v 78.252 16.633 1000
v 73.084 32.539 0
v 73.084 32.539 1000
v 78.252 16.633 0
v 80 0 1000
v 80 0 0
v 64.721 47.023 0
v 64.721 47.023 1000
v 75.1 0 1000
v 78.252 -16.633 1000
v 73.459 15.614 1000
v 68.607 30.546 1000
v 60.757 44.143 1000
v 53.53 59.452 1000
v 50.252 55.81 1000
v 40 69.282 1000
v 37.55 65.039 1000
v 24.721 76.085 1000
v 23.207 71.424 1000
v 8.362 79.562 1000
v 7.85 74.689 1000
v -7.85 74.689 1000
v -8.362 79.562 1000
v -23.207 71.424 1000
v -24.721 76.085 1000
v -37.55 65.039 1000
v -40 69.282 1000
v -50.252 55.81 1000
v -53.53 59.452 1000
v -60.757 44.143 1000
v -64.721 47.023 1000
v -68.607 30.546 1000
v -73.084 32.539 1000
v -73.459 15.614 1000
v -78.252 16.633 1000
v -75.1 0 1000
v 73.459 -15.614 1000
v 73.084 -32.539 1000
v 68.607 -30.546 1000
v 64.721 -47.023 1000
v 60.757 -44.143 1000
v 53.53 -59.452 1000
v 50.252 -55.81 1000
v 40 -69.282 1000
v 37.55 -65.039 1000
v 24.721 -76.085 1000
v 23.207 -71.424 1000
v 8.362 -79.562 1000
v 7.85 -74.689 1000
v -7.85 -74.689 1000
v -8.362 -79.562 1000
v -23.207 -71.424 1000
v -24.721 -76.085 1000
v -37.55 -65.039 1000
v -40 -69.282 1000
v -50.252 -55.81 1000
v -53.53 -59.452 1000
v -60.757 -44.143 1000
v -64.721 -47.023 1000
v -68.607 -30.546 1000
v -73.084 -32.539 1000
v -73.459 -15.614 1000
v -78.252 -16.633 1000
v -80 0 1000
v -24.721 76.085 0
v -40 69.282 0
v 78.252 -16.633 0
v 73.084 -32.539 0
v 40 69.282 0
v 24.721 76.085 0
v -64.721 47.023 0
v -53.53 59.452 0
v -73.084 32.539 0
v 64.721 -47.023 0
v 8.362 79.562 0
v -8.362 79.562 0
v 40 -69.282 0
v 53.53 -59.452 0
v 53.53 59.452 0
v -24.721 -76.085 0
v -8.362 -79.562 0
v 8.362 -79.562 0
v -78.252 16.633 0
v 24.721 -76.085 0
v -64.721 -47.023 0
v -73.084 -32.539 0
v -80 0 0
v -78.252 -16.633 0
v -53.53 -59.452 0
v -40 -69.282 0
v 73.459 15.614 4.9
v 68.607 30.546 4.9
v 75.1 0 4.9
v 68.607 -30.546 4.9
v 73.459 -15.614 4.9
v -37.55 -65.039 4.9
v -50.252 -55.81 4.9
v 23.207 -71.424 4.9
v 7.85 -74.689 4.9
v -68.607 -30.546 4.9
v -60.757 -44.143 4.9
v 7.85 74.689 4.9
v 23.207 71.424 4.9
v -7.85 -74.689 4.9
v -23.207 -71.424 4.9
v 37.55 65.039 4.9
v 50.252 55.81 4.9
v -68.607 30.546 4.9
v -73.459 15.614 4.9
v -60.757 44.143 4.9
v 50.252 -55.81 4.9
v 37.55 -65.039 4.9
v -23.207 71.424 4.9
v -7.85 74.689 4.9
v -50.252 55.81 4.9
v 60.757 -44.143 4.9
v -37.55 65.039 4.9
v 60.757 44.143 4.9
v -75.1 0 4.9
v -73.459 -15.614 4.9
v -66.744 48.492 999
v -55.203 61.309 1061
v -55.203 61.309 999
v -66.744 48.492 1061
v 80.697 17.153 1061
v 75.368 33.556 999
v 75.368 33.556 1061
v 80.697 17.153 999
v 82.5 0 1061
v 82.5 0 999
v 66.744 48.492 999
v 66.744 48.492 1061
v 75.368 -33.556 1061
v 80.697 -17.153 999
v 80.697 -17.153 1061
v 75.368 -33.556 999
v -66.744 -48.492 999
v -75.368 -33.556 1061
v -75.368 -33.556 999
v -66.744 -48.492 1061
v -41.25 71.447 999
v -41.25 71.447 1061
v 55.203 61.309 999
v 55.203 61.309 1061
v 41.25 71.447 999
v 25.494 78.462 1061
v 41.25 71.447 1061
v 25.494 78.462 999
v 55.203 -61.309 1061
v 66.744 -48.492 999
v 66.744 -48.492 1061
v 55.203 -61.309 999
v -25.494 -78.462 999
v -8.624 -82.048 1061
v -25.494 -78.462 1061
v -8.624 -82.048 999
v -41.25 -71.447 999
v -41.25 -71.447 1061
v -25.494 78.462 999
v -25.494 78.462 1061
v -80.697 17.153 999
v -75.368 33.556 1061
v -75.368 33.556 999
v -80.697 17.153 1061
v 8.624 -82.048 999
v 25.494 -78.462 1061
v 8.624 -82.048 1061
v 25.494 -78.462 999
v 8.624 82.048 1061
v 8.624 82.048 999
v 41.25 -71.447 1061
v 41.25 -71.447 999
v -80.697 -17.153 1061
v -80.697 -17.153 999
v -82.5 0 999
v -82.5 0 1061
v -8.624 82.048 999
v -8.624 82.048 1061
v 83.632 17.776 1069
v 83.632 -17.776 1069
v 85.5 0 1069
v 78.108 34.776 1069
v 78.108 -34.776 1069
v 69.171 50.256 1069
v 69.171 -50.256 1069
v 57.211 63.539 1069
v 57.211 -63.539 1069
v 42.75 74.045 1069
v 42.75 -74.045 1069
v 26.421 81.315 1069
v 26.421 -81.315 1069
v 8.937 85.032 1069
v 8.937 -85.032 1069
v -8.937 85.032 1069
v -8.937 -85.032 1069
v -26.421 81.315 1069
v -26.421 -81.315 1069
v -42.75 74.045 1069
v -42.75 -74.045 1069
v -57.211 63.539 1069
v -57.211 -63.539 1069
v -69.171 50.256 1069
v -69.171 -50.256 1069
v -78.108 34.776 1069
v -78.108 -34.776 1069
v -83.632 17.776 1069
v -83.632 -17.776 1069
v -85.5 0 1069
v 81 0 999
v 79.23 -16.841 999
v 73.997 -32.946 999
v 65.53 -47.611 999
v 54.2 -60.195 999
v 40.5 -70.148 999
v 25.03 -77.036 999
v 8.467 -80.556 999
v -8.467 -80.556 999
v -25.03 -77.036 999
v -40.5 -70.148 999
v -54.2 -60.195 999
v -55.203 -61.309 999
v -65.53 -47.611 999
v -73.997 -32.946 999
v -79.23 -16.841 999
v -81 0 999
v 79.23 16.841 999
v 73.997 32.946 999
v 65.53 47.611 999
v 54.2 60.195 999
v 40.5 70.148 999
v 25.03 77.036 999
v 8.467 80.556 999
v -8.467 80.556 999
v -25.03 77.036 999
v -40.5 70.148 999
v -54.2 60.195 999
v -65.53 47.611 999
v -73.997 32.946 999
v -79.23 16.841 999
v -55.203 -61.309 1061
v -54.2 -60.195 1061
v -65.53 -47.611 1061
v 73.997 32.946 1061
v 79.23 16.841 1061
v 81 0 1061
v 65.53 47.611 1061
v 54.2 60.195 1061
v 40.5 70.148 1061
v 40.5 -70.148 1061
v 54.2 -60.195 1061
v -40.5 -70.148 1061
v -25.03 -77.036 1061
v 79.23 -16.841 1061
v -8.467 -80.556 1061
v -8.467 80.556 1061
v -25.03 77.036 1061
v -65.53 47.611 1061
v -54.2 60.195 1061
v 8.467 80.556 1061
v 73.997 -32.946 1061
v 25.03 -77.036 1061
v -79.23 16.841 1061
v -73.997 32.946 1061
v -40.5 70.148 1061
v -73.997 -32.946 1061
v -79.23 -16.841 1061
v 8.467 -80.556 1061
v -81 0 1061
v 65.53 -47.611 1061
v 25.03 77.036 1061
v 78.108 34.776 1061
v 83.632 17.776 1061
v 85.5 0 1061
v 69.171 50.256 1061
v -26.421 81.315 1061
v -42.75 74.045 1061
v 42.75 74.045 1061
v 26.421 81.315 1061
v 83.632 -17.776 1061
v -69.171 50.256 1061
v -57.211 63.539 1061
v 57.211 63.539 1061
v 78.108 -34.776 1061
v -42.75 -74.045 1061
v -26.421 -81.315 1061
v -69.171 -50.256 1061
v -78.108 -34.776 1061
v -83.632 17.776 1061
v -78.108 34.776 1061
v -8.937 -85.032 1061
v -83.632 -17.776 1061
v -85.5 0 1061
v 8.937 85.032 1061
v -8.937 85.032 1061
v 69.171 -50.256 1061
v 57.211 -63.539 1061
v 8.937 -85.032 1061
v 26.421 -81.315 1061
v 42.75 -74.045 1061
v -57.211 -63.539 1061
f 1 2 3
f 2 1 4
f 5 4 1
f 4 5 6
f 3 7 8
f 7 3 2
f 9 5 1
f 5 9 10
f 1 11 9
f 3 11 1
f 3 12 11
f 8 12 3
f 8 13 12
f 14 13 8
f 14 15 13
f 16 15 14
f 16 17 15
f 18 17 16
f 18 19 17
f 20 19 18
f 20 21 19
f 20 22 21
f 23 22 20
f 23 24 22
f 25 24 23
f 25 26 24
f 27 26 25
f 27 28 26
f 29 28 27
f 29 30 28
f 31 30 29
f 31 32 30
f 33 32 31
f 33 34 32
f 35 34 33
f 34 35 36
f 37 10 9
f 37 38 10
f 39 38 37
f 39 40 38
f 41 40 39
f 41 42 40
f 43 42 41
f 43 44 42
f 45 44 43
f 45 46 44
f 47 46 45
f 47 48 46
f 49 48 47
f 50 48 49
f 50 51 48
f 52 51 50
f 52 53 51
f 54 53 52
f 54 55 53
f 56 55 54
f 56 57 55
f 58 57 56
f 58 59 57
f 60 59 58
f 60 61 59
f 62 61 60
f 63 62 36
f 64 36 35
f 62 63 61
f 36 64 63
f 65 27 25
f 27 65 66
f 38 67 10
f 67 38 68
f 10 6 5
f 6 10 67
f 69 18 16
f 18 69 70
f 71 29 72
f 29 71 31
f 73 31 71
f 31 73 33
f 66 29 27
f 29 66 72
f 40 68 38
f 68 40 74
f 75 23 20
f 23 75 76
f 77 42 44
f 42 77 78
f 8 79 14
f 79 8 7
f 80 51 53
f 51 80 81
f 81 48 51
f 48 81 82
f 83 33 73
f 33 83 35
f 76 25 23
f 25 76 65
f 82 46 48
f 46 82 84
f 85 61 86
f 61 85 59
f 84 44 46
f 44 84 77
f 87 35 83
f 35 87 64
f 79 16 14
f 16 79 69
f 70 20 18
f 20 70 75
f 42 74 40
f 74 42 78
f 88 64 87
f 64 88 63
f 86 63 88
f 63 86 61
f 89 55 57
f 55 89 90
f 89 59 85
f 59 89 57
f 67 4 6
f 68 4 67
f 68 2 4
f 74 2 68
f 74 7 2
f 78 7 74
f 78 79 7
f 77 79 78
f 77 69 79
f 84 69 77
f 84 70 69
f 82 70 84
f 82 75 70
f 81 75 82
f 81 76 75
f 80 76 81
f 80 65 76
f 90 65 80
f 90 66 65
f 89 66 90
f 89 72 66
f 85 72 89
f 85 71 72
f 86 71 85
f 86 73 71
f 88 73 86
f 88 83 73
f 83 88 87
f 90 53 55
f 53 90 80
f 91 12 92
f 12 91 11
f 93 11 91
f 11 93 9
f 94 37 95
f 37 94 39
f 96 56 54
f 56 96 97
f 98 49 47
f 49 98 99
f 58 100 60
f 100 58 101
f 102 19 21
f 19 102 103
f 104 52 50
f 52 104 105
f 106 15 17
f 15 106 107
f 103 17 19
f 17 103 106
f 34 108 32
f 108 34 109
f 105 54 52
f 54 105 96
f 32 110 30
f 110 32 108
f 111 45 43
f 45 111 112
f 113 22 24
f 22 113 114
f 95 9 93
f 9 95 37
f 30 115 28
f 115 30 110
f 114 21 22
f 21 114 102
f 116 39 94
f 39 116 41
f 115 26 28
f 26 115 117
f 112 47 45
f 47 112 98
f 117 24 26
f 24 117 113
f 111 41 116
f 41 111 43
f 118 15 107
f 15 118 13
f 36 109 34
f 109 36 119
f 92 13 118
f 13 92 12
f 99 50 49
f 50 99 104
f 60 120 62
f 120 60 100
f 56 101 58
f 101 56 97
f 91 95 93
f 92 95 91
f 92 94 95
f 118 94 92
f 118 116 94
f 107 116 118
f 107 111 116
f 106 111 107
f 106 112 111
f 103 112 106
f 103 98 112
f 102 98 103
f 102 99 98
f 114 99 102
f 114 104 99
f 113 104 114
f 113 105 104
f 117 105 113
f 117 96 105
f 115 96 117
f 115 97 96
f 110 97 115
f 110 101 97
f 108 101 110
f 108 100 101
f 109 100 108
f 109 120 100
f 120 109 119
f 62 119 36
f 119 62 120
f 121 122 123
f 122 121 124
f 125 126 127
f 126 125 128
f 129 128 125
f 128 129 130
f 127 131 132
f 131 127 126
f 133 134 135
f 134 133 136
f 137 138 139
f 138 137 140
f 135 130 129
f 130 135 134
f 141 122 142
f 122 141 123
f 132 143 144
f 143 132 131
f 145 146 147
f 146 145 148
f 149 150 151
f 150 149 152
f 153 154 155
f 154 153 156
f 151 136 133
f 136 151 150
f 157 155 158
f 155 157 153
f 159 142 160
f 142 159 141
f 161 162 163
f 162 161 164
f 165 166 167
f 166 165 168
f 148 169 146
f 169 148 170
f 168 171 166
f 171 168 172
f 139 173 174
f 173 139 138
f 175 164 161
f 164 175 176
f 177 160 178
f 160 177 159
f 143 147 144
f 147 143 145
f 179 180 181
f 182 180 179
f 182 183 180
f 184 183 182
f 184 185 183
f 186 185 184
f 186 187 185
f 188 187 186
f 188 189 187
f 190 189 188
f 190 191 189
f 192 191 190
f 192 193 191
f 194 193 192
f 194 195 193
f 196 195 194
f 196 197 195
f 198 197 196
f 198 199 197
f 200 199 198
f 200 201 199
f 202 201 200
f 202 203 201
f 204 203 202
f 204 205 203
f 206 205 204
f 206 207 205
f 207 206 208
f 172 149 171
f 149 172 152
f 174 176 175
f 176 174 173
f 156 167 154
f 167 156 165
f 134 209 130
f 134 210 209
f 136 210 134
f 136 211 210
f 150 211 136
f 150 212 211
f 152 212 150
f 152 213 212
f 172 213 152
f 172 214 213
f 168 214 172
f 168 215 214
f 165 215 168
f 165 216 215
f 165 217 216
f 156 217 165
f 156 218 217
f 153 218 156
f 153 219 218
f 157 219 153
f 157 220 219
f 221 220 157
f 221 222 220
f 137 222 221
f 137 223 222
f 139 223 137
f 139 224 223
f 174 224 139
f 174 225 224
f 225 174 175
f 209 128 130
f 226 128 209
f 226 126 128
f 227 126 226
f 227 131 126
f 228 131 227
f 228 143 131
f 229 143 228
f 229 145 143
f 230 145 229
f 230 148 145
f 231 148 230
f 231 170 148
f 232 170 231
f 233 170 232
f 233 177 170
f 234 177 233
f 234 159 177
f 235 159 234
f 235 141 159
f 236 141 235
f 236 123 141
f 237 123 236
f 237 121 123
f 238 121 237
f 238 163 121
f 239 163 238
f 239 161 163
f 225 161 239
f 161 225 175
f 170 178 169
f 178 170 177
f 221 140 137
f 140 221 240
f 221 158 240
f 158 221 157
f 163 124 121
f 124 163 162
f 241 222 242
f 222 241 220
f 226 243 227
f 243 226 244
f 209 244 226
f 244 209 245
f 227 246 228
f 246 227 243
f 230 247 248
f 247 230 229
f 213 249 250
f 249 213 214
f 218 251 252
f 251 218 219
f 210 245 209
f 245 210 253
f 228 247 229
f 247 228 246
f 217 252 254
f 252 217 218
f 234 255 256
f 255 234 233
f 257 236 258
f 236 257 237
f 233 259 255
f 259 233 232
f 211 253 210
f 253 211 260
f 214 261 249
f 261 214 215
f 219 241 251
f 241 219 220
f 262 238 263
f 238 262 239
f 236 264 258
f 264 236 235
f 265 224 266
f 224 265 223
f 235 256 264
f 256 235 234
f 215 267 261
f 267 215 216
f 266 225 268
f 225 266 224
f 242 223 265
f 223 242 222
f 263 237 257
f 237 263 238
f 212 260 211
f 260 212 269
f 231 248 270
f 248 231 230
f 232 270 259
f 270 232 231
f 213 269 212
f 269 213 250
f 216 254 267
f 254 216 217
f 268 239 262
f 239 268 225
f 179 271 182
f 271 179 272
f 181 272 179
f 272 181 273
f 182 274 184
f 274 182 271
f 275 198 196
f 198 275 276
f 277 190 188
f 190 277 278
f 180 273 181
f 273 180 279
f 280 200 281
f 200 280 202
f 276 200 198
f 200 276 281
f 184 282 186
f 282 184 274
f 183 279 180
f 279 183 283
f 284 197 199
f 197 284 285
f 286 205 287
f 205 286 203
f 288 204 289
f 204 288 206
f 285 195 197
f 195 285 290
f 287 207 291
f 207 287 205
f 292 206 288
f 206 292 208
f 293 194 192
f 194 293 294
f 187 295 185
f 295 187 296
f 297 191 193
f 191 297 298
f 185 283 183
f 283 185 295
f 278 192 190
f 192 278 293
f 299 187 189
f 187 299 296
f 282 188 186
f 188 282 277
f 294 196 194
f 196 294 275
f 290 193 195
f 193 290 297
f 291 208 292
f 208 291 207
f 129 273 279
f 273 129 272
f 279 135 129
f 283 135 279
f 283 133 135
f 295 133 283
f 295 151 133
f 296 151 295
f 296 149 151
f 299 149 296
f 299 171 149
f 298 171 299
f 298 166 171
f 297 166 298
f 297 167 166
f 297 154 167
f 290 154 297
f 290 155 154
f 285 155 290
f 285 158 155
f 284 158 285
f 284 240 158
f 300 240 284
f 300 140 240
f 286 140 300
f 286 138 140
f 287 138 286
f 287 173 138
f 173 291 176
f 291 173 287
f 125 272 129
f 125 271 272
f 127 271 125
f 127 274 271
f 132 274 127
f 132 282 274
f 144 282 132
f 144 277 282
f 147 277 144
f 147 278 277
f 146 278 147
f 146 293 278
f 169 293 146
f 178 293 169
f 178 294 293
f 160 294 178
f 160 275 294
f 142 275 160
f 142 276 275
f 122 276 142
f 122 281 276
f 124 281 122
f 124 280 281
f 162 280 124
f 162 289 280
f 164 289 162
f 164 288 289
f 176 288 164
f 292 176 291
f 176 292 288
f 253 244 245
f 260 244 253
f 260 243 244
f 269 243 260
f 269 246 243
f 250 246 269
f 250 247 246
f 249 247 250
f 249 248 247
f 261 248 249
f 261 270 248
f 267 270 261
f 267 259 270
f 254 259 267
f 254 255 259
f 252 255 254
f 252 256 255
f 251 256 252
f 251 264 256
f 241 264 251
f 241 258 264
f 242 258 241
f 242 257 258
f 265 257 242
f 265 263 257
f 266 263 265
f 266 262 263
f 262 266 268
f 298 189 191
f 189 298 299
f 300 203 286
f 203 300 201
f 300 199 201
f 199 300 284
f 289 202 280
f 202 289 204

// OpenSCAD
// Parameters
pipe_standard = 1; //[1:1:1]
nominal_diameter_mm = 160; //[80:320:1]
length_mm = 1000; //[500:2000:10]
center = 0; //[0:1:1]
wall_thickness_mm = 4.9; //[2.5:10:0.1]
fit_socket_length_mm = 70; //[35:140:1]
fit_socket_wall_extra_mm = 2.5; //[1:6:0.1]
fit_stop_ring_length_mm = 8; //[4:20:1]
fit_stop_ring_radial_mm = 3; //[1:8:0.1]
fit_overlap_mm = 1; //[0.5:2:0.1]
fit_socket_id_clearance_mm = 1; //[0.2:2:0.1]

// HT Pipe - complete geometry
module ht_pipe() {
  color([0.85, 0.85, 0.8]) {
    // Pipe segment
    difference() {
      cylinder(h=length_mm, r=nominal_diameter_mm/2, center=false);
      translate([0, 0, wall_thickness_mm])
        cylinder(h=length_mm, r=nominal_diameter_mm/2 - wall_thickness_mm, center=false);
    }
    
    // End fitting socket
    difference() {
      translate([0, 0, length_mm - fit_overlap_mm])
        cylinder(h=fit_socket_length_mm, r=nominal_diameter_mm/2 + fit_socket_wall_extra_mm, center=false);
      translate([0, 0, length_mm - fit_overlap_mm])
        cylinder(h=fit_socket_length_mm, r=nominal_diameter_mm/2 + fit_socket_id_clearance_mm, center=false);
    }
    
    // Stop ring
    translate([0, 0, length_mm - fit_overlap_mm + fit_socket_length_mm - fit_stop_ring_length_mm])
      cylinder(h=fit_stop_ring_length_mm, r=nominal_diameter_mm/2 + fit_socket_wall_extra_mm + fit_stop_ring_radial_mm, center=false);
  }
}

// Assembly
module assembly() {
  ht_pipe();
}

assembly();
